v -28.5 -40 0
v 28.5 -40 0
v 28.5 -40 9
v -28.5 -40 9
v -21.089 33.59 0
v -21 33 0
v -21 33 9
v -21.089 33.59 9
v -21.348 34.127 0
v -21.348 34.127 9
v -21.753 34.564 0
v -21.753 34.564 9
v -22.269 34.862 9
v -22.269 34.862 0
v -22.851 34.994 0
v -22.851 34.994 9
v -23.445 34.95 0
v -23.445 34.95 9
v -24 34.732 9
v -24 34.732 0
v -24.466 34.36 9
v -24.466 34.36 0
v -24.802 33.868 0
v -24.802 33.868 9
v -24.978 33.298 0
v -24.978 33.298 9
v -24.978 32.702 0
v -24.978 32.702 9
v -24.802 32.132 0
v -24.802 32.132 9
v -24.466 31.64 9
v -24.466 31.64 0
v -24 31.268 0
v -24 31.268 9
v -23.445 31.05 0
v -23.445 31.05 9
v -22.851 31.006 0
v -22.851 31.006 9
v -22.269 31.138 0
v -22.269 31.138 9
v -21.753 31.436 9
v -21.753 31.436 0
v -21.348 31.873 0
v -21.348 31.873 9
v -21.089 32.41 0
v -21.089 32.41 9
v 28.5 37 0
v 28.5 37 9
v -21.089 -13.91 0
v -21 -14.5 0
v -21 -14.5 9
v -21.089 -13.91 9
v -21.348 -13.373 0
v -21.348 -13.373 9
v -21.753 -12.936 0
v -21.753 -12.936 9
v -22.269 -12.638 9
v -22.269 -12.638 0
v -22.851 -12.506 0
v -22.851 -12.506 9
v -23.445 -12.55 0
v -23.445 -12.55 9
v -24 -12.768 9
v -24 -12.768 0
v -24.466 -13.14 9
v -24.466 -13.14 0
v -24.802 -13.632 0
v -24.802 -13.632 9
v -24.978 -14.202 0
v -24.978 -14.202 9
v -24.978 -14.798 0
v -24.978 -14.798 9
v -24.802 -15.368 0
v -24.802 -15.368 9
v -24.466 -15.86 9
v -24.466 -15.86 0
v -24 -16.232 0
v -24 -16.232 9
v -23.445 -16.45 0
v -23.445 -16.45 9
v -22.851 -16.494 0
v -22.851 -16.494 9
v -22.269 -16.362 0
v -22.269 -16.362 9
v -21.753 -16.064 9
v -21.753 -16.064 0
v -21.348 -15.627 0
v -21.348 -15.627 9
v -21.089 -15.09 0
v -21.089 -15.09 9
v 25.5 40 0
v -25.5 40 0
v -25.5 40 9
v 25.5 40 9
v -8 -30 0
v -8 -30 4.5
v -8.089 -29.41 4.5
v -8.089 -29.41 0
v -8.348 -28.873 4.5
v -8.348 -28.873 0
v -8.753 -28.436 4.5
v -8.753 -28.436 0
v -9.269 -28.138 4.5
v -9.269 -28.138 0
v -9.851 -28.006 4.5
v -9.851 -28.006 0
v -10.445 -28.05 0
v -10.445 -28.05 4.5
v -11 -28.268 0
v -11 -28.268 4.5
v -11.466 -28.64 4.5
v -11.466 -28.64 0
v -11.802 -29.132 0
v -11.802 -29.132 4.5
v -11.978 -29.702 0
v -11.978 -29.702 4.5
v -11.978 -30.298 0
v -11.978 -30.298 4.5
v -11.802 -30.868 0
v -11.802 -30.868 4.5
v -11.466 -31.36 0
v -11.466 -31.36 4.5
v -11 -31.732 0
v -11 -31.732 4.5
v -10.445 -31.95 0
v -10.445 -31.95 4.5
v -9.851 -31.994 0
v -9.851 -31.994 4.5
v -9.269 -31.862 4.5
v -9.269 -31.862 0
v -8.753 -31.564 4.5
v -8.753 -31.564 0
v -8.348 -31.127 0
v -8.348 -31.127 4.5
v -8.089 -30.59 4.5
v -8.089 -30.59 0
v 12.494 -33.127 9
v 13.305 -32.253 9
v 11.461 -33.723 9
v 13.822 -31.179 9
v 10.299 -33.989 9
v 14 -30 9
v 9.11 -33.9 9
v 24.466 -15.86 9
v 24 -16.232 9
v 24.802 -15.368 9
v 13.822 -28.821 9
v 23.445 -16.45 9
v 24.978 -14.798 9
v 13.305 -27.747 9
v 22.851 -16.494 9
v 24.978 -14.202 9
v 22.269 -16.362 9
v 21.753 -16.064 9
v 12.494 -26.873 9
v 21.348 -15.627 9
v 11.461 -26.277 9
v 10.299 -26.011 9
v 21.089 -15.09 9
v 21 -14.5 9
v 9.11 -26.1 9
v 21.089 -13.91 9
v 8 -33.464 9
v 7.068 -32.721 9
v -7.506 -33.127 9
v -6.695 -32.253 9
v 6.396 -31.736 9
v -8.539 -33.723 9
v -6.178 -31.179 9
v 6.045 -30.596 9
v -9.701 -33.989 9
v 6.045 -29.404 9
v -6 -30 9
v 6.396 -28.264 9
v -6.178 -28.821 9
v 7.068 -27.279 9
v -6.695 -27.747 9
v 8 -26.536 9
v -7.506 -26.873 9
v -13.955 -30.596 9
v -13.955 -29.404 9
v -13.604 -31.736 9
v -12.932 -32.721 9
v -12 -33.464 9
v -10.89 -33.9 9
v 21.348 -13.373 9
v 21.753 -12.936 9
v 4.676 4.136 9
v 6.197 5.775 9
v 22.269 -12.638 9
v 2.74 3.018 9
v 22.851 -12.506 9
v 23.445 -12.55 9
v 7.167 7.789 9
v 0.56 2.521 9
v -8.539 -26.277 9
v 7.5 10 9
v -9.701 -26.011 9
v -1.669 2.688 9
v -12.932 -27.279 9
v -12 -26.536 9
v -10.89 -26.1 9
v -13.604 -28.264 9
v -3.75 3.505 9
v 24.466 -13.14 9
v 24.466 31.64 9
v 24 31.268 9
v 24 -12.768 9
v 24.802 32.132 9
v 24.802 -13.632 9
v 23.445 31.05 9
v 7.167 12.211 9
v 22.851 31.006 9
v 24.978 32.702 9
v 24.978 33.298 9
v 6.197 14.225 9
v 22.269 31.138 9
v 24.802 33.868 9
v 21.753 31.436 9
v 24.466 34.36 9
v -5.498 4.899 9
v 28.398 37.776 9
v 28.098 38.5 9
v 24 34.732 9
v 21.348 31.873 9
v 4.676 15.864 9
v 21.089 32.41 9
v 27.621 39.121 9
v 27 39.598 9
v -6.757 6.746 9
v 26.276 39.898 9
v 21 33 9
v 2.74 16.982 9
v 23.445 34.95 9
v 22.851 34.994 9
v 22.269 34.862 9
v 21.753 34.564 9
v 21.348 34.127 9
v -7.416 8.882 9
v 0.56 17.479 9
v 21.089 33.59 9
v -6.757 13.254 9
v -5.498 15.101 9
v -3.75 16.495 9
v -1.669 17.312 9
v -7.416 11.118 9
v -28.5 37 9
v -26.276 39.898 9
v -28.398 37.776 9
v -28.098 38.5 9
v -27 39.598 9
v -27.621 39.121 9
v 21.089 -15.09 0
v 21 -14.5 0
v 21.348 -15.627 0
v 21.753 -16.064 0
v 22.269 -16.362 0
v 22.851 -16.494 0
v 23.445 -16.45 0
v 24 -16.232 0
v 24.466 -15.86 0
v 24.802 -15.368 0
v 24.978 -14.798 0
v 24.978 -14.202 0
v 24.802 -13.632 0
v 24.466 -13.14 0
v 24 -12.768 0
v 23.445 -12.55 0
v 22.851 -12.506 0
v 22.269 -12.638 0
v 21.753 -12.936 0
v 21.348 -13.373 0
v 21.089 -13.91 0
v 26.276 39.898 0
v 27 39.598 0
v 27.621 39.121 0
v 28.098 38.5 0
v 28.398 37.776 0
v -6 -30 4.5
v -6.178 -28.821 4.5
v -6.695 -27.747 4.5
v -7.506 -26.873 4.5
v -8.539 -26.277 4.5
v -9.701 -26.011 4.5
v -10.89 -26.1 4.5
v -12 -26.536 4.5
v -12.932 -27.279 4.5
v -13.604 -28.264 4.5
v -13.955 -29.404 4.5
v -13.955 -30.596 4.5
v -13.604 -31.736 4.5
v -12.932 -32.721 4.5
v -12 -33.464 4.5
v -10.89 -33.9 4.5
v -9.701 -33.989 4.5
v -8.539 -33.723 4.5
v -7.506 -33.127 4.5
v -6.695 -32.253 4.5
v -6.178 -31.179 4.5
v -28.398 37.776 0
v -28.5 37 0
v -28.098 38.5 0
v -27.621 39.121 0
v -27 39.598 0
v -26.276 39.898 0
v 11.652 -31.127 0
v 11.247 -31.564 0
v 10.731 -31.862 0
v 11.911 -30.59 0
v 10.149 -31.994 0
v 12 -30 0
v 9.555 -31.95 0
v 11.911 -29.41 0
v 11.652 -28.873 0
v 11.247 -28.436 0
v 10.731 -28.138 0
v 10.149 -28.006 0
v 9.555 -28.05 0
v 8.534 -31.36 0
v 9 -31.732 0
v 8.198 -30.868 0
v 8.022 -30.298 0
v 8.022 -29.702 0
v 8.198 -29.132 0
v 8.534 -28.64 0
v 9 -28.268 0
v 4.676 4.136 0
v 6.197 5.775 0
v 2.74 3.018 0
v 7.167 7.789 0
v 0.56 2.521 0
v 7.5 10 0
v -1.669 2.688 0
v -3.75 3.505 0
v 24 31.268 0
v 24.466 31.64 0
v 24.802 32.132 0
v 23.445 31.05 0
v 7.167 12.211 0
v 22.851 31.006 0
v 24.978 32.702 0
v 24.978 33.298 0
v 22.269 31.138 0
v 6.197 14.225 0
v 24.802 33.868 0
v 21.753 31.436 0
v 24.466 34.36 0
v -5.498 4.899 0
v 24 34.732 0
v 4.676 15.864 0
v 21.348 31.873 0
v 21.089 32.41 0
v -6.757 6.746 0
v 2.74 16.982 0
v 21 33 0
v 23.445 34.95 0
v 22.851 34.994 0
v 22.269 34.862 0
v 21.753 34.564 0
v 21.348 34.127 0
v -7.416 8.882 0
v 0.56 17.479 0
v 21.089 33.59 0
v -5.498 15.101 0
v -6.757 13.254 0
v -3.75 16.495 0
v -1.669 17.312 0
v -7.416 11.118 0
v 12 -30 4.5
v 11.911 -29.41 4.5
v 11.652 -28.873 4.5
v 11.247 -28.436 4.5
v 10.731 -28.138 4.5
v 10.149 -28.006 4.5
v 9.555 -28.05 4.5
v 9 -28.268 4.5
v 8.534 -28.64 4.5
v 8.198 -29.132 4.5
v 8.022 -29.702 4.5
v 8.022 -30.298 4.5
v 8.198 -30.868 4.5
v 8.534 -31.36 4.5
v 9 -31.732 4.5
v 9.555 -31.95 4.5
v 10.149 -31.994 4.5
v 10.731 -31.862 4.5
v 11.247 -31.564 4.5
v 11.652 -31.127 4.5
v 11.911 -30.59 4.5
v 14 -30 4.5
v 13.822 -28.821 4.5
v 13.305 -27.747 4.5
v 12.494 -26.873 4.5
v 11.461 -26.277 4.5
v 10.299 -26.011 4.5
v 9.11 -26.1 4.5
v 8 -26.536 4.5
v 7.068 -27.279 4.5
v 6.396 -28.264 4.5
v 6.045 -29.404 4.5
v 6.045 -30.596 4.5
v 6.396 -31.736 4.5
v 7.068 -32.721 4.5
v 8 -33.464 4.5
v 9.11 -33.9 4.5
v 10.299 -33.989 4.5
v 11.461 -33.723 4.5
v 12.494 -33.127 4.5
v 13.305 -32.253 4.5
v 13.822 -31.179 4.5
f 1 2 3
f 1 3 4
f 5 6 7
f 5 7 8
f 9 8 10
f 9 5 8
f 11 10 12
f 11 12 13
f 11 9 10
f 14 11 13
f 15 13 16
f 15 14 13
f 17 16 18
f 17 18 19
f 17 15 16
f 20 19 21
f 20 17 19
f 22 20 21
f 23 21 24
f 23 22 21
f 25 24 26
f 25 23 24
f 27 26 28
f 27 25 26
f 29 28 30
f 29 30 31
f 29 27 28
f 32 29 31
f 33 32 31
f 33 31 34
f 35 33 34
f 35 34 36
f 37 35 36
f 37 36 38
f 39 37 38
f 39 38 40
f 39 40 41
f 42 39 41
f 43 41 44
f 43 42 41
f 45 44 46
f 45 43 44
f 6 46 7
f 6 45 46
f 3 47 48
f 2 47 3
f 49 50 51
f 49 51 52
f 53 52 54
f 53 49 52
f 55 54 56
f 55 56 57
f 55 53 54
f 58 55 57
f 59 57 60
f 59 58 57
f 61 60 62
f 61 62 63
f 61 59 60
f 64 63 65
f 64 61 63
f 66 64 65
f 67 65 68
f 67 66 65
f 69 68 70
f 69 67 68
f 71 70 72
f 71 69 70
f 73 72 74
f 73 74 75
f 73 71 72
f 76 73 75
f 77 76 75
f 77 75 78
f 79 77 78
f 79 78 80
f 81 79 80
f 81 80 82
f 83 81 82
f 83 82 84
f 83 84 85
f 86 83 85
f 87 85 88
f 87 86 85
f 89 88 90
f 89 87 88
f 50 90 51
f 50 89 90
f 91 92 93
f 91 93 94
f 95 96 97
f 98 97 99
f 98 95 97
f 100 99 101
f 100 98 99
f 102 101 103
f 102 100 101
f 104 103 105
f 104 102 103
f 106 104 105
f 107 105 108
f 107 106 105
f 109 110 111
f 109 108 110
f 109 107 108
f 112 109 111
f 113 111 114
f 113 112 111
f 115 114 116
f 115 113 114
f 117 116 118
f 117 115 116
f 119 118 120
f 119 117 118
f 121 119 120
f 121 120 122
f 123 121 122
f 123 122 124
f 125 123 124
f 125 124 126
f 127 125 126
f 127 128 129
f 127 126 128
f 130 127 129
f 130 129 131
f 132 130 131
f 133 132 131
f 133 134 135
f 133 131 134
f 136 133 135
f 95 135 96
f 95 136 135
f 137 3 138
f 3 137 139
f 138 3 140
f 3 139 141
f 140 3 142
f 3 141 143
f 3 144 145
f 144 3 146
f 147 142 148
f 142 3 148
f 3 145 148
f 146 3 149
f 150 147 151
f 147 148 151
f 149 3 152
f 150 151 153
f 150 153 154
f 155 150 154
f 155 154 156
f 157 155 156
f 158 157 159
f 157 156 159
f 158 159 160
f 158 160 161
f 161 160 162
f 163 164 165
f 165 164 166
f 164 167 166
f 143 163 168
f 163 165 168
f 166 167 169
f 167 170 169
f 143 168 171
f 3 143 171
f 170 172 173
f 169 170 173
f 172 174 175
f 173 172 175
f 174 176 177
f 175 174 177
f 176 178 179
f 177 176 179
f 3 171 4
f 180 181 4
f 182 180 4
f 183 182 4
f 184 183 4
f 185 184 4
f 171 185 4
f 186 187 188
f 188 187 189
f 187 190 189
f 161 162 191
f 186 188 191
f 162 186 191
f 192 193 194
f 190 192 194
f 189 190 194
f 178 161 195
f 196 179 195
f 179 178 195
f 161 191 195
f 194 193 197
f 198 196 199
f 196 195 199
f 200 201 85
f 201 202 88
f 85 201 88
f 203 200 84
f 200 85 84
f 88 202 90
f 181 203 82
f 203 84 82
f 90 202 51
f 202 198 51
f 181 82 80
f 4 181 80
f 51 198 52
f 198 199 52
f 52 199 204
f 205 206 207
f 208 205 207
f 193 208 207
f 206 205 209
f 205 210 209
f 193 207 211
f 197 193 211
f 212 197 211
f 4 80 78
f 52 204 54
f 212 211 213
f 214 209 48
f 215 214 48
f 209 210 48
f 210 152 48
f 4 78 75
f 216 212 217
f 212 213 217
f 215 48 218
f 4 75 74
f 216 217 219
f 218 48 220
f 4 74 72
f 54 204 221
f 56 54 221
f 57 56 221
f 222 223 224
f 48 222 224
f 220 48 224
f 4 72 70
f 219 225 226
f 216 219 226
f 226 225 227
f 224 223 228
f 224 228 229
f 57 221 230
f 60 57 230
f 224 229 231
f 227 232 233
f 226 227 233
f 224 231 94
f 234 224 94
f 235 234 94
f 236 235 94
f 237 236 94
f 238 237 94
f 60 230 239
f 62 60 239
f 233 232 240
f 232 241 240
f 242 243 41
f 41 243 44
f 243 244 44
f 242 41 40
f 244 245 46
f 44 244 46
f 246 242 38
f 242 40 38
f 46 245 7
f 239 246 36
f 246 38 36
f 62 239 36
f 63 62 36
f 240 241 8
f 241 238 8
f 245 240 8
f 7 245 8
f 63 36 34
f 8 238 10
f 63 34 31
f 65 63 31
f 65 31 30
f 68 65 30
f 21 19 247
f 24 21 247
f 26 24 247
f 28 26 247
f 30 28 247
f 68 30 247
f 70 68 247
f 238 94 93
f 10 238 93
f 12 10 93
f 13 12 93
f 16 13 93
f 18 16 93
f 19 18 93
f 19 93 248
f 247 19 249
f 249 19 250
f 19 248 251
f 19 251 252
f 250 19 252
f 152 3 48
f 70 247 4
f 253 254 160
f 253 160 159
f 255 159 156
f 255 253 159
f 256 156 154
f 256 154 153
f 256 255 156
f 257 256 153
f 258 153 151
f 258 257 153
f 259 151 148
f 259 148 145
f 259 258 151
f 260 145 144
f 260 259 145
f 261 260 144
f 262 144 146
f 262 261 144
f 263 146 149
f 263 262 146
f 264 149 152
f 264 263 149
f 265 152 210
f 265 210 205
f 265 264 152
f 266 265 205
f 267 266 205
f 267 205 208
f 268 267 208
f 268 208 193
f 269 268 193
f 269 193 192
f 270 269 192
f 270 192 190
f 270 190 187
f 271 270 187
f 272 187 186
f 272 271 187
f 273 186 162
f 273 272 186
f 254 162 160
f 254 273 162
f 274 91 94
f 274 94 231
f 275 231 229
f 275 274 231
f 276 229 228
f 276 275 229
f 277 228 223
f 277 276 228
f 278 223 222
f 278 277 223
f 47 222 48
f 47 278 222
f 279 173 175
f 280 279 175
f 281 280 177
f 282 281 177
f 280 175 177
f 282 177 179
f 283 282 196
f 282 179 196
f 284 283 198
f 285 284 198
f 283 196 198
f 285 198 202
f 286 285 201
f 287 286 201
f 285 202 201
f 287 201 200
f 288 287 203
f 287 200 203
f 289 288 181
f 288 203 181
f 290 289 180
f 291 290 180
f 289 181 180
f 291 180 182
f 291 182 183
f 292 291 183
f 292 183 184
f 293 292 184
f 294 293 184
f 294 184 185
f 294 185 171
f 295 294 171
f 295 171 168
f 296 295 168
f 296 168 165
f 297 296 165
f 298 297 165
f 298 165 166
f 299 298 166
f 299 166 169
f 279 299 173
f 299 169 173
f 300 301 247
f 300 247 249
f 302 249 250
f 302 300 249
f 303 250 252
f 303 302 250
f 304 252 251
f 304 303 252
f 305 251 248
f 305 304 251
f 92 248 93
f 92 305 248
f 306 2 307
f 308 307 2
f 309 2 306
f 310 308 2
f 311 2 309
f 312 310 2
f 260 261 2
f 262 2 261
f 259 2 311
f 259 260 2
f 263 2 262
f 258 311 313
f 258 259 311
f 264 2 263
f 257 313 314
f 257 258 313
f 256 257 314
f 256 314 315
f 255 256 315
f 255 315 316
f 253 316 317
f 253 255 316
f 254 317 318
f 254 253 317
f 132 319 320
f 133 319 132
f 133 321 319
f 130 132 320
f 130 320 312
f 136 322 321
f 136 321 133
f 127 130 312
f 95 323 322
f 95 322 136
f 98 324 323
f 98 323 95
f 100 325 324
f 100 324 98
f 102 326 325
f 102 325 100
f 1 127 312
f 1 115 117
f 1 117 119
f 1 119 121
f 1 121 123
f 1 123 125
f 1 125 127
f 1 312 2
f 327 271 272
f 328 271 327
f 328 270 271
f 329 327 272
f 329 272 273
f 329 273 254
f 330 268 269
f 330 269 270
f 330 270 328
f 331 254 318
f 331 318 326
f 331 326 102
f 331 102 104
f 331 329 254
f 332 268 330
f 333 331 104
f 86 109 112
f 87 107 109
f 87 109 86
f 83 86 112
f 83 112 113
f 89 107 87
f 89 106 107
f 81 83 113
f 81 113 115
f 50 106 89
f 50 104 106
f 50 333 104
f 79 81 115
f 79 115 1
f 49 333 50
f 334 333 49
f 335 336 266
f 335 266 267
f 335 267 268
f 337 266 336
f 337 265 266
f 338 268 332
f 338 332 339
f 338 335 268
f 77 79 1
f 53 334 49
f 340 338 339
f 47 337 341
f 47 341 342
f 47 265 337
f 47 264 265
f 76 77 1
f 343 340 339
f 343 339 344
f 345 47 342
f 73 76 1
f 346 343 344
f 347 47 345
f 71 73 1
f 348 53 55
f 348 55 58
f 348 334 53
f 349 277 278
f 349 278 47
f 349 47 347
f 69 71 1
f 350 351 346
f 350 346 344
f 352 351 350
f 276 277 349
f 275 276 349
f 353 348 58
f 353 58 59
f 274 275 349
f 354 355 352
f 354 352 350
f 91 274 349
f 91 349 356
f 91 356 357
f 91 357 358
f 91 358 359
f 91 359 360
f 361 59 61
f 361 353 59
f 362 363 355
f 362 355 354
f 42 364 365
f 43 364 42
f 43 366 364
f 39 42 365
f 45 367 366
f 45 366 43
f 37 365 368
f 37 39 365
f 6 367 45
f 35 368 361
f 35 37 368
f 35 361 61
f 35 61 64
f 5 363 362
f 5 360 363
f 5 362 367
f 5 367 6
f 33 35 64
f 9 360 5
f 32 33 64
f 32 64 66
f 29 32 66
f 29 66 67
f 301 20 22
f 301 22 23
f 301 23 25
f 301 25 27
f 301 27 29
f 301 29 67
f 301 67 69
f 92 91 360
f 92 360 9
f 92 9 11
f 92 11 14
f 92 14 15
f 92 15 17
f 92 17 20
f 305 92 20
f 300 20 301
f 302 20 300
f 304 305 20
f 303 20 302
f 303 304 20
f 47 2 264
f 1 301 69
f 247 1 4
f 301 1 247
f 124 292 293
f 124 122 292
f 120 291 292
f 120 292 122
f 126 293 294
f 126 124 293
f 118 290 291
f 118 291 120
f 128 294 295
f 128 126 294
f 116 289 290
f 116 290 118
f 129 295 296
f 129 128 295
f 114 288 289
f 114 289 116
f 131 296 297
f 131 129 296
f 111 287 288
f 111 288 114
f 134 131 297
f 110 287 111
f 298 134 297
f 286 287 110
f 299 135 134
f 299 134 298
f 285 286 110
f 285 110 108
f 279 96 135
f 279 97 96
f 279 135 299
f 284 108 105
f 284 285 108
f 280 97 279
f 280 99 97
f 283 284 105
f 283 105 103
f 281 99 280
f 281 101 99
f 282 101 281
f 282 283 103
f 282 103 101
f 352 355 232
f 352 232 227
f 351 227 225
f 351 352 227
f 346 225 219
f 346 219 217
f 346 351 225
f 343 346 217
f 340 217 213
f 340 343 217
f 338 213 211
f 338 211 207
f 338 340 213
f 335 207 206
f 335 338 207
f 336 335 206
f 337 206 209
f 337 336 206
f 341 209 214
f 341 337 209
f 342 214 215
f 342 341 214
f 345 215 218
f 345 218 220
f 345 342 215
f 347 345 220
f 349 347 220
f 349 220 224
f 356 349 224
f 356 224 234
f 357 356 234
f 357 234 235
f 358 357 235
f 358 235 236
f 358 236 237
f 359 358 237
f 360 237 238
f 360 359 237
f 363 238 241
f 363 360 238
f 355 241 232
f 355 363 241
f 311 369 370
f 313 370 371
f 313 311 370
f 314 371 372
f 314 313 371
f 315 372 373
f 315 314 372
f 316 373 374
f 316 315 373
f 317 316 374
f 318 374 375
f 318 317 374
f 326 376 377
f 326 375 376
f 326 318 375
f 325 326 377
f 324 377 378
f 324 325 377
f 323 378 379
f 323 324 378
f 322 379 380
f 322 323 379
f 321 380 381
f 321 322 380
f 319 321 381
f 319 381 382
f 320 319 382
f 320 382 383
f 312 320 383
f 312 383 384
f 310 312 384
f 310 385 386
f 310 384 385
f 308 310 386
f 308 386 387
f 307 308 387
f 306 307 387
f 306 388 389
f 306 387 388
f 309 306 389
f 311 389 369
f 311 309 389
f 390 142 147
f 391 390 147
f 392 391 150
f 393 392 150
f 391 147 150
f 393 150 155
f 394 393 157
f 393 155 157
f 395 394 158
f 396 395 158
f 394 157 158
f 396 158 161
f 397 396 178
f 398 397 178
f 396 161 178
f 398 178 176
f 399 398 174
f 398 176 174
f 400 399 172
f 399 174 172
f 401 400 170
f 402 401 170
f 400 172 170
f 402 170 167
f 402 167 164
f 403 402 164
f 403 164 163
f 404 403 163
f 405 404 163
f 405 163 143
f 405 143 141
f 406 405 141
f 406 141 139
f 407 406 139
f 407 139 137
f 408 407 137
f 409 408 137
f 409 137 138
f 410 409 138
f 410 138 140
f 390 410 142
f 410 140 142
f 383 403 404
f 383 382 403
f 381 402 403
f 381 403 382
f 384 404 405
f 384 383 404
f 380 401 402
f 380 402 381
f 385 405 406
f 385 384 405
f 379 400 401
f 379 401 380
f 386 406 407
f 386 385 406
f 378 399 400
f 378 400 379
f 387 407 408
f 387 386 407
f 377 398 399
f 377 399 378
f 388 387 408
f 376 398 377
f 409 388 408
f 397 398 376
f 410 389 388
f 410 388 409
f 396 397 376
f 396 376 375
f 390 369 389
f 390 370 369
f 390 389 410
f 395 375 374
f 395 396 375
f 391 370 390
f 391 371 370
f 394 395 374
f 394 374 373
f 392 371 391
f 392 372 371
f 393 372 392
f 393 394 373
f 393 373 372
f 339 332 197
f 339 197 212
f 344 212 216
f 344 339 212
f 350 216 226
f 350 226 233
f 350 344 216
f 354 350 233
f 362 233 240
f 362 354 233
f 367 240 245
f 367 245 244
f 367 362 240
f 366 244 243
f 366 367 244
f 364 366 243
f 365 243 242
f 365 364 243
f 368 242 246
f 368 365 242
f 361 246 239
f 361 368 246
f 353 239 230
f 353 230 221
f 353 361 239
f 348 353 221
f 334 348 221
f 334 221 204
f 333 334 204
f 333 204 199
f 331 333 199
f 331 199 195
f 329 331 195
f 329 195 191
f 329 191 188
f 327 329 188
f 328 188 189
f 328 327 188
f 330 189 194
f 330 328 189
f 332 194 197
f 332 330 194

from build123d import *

# Parameters (mm, degrees)
CROQUIS1_R              = 7.5
CROQUIS1_R_2            = 2
SALIENTE_EXTRUIR1_DEPTH = 9
CROQUIS2_R              = 4
CORTAR_EXTRUIR1_DEPTH   = 4.5


with BuildPart() as part:
    # Croquis1 → Saliente-Extruir1 (new body)
    with BuildSketch(Plane.XY):
        with BuildLine():
            Line((-25.5, 40), (25.5, 40))
            ThreePointArc((25.5, 40), (27.621320344, 39.121320344), (28.5, 37))
            Line((28.5, 37), (28.5, -40))
            Line((28.5, -40), (-28.5, -40))
            Line((-28.5, -40), (-28.5, 37))
            ThreePointArc((-28.5, 37), (-27.621320344, 39.121320344), (-25.5, 40))
        make_face()
        with Locations((0, 10)):
            Circle(CROQUIS1_R, mode=Mode.SUBTRACT)
        with Locations((10, -30)):
            Circle(CROQUIS1_R_2, mode=Mode.SUBTRACT)
        with Locations((-10, -30)):
            Circle(CROQUIS1_R_2, mode=Mode.SUBTRACT)
        with Locations((-23, 33)):
            Circle(CROQUIS1_R_2, mode=Mode.SUBTRACT)
        with Locations((-23, -14.5)):
            Circle(CROQUIS1_R_2, mode=Mode.SUBTRACT)
        with Locations(Location((23, -14.5, 0), (0, 0, 180))):
            Circle(CROQUIS1_R_2, mode=Mode.SUBTRACT)
        with Locations(Location((23, 33, 0), (0, 0, 180))):
            Circle(CROQUIS1_R_2, mode=Mode.SUBTRACT)
    extrude(amount=SALIENTE_EXTRUIR1_DEPTH)

    # Croquis2 → Cortar-Extruir1 (cut)
    with BuildSketch(Plane.XY.offset(9)):
        with Locations((-10, -30)):
            Circle(CROQUIS2_R)
        with Locations((10, -30)):
            Circle(CROQUIS2_R)
    extrude(amount=-CORTAR_EXTRUIR1_DEPTH, mode=Mode.SUBTRACT)


solid = part.part
